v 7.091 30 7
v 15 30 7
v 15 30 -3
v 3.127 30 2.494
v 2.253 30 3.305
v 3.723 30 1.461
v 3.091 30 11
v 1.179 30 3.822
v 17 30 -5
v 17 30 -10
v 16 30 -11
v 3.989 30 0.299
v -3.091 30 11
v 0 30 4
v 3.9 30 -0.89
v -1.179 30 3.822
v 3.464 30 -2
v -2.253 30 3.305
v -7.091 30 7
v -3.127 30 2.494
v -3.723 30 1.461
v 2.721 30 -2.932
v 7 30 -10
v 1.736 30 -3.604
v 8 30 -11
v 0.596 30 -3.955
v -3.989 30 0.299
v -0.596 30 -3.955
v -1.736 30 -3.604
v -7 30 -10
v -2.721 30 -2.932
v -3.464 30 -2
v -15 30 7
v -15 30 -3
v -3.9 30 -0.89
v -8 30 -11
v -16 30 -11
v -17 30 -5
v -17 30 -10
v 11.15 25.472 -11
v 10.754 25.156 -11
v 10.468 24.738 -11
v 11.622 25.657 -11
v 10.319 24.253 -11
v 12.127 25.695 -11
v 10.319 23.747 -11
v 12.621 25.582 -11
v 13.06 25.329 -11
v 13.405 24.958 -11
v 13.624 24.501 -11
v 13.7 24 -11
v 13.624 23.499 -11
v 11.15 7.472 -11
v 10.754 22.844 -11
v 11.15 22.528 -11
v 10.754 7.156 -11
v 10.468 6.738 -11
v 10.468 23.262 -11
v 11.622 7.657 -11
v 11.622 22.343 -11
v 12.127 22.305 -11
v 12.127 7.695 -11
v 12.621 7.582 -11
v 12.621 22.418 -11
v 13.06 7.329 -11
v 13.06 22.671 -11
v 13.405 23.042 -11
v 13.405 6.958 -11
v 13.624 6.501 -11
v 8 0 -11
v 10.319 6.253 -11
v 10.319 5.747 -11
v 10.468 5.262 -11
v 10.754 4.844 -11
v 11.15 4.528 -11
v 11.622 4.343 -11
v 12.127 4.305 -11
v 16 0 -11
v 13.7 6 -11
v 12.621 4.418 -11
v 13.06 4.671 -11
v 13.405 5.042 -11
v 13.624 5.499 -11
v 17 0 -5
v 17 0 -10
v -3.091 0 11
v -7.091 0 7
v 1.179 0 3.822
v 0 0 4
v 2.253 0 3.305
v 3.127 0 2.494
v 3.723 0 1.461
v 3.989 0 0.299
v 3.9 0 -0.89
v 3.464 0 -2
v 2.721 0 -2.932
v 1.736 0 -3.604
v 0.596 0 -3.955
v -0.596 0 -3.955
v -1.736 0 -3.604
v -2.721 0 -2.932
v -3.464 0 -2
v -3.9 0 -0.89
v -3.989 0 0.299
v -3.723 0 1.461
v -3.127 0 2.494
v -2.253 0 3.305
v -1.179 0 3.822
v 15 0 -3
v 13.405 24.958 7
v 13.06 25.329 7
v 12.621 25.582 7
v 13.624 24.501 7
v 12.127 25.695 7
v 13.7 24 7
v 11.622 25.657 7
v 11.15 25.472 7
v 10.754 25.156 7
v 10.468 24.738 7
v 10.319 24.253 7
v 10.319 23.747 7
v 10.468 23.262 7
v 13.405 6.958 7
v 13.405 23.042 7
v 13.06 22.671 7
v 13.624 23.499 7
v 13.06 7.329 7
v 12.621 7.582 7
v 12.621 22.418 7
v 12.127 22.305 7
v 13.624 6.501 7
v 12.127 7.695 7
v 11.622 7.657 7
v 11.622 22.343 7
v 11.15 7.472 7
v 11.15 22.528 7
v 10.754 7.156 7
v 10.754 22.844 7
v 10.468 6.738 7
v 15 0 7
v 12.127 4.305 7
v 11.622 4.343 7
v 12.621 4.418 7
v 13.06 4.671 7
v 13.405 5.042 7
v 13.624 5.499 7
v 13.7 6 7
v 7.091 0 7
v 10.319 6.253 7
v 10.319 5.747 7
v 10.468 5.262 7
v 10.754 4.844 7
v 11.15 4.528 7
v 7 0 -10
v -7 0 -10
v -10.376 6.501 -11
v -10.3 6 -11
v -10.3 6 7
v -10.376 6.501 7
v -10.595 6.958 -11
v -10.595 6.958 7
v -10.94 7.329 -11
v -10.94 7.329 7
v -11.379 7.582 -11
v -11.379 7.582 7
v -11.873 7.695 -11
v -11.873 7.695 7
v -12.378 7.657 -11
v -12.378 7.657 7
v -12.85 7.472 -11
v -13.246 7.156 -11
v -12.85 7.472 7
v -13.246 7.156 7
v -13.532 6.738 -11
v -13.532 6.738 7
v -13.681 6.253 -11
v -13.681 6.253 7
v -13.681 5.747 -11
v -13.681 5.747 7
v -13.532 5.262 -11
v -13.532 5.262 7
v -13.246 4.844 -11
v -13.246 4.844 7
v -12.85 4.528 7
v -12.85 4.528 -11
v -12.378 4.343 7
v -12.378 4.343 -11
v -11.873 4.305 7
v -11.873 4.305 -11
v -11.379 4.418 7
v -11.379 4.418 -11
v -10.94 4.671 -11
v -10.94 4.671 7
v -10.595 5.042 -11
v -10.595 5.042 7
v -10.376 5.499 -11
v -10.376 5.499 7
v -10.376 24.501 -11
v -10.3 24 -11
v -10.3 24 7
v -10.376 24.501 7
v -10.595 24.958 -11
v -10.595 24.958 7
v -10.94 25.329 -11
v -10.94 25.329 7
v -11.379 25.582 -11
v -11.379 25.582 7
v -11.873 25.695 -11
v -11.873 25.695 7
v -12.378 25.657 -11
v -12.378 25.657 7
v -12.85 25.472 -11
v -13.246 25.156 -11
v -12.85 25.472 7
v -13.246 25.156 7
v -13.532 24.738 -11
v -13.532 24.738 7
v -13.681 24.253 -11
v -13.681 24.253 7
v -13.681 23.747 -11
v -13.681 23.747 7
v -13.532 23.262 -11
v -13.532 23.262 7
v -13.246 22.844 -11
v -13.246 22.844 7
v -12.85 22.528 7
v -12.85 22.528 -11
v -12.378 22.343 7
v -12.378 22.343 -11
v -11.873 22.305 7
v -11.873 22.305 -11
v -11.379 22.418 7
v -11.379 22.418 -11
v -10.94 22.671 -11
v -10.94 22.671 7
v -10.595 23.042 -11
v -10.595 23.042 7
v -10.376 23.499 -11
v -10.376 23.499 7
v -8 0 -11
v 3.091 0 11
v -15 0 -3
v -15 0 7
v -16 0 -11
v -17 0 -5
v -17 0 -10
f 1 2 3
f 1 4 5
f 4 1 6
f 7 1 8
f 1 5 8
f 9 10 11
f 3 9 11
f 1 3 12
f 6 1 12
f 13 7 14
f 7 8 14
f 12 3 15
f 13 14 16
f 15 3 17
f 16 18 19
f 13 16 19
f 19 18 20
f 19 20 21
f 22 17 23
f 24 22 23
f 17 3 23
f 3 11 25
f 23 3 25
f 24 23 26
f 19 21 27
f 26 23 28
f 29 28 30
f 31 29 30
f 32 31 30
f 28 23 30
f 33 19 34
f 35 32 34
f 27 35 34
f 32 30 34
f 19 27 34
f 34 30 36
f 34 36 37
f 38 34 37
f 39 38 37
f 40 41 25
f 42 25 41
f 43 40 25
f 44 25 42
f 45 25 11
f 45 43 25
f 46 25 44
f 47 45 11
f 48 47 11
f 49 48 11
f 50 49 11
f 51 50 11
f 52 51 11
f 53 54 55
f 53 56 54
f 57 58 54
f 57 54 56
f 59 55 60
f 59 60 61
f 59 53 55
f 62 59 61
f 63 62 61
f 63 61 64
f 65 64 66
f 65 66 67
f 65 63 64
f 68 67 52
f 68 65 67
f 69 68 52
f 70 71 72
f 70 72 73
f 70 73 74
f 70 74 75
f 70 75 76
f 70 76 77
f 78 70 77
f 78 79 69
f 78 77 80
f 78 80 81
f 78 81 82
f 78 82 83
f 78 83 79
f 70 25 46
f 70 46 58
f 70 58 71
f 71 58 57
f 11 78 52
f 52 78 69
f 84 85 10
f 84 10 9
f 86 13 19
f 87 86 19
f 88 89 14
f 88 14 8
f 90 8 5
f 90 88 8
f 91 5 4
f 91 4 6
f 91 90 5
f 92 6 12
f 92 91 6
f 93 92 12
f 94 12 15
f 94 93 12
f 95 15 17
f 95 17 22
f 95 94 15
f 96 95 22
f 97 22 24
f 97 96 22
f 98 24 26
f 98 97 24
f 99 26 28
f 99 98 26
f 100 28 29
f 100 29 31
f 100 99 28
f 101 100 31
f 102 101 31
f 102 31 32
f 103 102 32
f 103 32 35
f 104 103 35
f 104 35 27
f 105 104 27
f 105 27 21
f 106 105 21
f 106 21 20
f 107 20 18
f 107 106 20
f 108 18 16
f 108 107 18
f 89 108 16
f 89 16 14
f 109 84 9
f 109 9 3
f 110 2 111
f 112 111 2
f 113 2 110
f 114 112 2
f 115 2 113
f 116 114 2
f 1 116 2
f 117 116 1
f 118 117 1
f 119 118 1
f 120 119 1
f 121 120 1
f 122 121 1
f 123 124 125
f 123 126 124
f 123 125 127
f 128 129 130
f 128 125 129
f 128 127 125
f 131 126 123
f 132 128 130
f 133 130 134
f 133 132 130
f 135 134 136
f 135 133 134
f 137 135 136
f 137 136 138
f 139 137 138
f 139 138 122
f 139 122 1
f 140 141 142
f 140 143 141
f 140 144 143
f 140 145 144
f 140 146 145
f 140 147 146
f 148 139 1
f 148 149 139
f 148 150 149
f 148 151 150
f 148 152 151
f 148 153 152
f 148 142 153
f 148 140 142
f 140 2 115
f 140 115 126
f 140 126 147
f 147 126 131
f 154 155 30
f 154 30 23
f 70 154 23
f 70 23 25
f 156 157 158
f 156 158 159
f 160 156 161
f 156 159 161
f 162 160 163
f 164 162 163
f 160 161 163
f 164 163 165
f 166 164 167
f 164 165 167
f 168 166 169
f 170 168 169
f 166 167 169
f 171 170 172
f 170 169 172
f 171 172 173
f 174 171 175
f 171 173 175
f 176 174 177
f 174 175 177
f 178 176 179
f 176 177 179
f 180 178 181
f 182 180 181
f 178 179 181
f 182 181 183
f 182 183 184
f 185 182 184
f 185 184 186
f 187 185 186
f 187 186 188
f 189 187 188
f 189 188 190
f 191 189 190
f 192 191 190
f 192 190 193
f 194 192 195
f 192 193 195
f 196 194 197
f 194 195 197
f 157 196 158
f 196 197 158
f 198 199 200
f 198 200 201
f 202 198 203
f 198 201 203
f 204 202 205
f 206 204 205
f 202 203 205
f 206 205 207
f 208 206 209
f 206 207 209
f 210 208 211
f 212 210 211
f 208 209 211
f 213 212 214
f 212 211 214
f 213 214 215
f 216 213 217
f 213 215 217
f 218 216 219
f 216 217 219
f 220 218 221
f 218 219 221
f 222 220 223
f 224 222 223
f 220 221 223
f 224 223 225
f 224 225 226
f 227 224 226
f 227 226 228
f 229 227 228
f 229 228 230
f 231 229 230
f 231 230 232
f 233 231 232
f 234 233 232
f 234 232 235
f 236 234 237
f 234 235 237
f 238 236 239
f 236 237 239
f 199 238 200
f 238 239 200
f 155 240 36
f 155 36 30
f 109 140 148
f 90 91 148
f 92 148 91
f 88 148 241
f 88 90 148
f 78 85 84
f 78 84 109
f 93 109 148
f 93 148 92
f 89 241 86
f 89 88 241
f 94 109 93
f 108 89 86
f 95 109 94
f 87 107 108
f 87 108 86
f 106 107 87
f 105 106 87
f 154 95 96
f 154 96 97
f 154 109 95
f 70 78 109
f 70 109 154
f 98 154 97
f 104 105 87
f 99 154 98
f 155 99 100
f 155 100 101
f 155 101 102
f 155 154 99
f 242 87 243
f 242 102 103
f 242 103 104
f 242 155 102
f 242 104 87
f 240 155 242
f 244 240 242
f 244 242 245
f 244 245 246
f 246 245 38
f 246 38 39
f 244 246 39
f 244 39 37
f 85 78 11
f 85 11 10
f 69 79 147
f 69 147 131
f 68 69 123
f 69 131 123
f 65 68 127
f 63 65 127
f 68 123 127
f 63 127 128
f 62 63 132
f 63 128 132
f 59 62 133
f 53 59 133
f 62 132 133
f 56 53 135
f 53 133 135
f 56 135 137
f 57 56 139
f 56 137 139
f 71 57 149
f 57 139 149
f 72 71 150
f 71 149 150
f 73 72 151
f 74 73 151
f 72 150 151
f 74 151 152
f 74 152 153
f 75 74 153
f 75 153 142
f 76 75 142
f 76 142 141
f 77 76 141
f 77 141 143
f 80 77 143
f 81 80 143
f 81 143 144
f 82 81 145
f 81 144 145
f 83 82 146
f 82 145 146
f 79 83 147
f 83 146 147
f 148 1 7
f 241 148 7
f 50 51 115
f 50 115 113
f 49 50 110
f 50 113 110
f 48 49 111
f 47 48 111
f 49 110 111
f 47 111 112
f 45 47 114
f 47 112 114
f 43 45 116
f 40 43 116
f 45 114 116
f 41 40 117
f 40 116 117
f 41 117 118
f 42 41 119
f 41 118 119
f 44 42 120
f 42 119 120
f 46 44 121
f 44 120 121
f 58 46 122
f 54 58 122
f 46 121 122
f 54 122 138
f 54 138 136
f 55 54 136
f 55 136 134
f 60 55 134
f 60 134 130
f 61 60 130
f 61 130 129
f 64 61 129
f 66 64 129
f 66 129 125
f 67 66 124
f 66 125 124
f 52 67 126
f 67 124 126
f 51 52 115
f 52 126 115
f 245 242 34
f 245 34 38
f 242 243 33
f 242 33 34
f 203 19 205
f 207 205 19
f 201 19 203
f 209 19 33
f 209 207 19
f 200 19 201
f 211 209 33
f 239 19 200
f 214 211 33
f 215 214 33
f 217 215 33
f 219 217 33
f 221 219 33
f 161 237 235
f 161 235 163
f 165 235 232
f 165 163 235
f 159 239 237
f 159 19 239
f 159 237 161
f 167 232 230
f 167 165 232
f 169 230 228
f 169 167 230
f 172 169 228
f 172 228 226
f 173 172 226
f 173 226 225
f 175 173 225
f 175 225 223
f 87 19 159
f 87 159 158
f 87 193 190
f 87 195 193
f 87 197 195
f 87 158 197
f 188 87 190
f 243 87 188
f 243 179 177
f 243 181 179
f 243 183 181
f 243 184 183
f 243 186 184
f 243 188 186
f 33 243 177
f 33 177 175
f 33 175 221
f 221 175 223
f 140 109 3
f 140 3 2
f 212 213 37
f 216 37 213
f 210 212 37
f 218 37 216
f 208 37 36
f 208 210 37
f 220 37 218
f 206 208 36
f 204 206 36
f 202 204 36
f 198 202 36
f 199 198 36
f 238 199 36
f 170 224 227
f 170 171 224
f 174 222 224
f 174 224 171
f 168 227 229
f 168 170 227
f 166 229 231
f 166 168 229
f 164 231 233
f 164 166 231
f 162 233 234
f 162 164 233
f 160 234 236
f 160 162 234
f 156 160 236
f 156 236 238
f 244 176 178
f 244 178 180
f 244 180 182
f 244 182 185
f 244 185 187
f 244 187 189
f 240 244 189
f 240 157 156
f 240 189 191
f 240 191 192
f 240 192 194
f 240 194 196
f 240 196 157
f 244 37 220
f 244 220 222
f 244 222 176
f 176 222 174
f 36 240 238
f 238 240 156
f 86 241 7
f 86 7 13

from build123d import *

# Parameters (mm, degrees)
SKETCH1_R           = 4
BOSS_EXTRUDE1_DEPTH = 30
SKETCH2_R           = 1.7
CUT_EXTRUDE1_DEPTH  = 18


with BuildPart() as part:
    # Sketch1 → Boss-Extrude1 (new body)
    with BuildSketch(Plane(origin=(0, 0, 0), x_dir=(1, 0, 0), z_dir=(0, 1, 0))):
        Polygon((-7, 10), (7, 10), (8, 11), (16, 11), (17, 10), (17, 5), (15, 3), (15, -7), (7.091285061, -7), (3.091285061, -11), (-3.091285061, -11), (-7.091285061, -7), (-15, -7), (-15, 3), (-17, 5), (-17, 10), (-16, 11), (-8, 11), align=None)
        with Locations(Location((0, 0, 0), (0, 0, 270))):
            Circle(SKETCH1_R, mode=Mode.SUBTRACT)
    extrude(amount=BOSS_EXTRUDE1_DEPTH)

    # Sketch2 → Cut-Extrude1 (cut)
    with BuildSketch(Plane.XY.offset(7)):
        with Locations((12, 24)):
            Circle(SKETCH2_R)
        with Locations((-12, 24)):
            Circle(SKETCH2_R)
        with Locations((-12, 6)):
            Circle(SKETCH2_R)
        with Locations((12, 6)):
            Circle(SKETCH2_R)
    extrude(amount=-CUT_EXTRUDE1_DEPTH, mode=Mode.SUBTRACT)


solid = part.part
